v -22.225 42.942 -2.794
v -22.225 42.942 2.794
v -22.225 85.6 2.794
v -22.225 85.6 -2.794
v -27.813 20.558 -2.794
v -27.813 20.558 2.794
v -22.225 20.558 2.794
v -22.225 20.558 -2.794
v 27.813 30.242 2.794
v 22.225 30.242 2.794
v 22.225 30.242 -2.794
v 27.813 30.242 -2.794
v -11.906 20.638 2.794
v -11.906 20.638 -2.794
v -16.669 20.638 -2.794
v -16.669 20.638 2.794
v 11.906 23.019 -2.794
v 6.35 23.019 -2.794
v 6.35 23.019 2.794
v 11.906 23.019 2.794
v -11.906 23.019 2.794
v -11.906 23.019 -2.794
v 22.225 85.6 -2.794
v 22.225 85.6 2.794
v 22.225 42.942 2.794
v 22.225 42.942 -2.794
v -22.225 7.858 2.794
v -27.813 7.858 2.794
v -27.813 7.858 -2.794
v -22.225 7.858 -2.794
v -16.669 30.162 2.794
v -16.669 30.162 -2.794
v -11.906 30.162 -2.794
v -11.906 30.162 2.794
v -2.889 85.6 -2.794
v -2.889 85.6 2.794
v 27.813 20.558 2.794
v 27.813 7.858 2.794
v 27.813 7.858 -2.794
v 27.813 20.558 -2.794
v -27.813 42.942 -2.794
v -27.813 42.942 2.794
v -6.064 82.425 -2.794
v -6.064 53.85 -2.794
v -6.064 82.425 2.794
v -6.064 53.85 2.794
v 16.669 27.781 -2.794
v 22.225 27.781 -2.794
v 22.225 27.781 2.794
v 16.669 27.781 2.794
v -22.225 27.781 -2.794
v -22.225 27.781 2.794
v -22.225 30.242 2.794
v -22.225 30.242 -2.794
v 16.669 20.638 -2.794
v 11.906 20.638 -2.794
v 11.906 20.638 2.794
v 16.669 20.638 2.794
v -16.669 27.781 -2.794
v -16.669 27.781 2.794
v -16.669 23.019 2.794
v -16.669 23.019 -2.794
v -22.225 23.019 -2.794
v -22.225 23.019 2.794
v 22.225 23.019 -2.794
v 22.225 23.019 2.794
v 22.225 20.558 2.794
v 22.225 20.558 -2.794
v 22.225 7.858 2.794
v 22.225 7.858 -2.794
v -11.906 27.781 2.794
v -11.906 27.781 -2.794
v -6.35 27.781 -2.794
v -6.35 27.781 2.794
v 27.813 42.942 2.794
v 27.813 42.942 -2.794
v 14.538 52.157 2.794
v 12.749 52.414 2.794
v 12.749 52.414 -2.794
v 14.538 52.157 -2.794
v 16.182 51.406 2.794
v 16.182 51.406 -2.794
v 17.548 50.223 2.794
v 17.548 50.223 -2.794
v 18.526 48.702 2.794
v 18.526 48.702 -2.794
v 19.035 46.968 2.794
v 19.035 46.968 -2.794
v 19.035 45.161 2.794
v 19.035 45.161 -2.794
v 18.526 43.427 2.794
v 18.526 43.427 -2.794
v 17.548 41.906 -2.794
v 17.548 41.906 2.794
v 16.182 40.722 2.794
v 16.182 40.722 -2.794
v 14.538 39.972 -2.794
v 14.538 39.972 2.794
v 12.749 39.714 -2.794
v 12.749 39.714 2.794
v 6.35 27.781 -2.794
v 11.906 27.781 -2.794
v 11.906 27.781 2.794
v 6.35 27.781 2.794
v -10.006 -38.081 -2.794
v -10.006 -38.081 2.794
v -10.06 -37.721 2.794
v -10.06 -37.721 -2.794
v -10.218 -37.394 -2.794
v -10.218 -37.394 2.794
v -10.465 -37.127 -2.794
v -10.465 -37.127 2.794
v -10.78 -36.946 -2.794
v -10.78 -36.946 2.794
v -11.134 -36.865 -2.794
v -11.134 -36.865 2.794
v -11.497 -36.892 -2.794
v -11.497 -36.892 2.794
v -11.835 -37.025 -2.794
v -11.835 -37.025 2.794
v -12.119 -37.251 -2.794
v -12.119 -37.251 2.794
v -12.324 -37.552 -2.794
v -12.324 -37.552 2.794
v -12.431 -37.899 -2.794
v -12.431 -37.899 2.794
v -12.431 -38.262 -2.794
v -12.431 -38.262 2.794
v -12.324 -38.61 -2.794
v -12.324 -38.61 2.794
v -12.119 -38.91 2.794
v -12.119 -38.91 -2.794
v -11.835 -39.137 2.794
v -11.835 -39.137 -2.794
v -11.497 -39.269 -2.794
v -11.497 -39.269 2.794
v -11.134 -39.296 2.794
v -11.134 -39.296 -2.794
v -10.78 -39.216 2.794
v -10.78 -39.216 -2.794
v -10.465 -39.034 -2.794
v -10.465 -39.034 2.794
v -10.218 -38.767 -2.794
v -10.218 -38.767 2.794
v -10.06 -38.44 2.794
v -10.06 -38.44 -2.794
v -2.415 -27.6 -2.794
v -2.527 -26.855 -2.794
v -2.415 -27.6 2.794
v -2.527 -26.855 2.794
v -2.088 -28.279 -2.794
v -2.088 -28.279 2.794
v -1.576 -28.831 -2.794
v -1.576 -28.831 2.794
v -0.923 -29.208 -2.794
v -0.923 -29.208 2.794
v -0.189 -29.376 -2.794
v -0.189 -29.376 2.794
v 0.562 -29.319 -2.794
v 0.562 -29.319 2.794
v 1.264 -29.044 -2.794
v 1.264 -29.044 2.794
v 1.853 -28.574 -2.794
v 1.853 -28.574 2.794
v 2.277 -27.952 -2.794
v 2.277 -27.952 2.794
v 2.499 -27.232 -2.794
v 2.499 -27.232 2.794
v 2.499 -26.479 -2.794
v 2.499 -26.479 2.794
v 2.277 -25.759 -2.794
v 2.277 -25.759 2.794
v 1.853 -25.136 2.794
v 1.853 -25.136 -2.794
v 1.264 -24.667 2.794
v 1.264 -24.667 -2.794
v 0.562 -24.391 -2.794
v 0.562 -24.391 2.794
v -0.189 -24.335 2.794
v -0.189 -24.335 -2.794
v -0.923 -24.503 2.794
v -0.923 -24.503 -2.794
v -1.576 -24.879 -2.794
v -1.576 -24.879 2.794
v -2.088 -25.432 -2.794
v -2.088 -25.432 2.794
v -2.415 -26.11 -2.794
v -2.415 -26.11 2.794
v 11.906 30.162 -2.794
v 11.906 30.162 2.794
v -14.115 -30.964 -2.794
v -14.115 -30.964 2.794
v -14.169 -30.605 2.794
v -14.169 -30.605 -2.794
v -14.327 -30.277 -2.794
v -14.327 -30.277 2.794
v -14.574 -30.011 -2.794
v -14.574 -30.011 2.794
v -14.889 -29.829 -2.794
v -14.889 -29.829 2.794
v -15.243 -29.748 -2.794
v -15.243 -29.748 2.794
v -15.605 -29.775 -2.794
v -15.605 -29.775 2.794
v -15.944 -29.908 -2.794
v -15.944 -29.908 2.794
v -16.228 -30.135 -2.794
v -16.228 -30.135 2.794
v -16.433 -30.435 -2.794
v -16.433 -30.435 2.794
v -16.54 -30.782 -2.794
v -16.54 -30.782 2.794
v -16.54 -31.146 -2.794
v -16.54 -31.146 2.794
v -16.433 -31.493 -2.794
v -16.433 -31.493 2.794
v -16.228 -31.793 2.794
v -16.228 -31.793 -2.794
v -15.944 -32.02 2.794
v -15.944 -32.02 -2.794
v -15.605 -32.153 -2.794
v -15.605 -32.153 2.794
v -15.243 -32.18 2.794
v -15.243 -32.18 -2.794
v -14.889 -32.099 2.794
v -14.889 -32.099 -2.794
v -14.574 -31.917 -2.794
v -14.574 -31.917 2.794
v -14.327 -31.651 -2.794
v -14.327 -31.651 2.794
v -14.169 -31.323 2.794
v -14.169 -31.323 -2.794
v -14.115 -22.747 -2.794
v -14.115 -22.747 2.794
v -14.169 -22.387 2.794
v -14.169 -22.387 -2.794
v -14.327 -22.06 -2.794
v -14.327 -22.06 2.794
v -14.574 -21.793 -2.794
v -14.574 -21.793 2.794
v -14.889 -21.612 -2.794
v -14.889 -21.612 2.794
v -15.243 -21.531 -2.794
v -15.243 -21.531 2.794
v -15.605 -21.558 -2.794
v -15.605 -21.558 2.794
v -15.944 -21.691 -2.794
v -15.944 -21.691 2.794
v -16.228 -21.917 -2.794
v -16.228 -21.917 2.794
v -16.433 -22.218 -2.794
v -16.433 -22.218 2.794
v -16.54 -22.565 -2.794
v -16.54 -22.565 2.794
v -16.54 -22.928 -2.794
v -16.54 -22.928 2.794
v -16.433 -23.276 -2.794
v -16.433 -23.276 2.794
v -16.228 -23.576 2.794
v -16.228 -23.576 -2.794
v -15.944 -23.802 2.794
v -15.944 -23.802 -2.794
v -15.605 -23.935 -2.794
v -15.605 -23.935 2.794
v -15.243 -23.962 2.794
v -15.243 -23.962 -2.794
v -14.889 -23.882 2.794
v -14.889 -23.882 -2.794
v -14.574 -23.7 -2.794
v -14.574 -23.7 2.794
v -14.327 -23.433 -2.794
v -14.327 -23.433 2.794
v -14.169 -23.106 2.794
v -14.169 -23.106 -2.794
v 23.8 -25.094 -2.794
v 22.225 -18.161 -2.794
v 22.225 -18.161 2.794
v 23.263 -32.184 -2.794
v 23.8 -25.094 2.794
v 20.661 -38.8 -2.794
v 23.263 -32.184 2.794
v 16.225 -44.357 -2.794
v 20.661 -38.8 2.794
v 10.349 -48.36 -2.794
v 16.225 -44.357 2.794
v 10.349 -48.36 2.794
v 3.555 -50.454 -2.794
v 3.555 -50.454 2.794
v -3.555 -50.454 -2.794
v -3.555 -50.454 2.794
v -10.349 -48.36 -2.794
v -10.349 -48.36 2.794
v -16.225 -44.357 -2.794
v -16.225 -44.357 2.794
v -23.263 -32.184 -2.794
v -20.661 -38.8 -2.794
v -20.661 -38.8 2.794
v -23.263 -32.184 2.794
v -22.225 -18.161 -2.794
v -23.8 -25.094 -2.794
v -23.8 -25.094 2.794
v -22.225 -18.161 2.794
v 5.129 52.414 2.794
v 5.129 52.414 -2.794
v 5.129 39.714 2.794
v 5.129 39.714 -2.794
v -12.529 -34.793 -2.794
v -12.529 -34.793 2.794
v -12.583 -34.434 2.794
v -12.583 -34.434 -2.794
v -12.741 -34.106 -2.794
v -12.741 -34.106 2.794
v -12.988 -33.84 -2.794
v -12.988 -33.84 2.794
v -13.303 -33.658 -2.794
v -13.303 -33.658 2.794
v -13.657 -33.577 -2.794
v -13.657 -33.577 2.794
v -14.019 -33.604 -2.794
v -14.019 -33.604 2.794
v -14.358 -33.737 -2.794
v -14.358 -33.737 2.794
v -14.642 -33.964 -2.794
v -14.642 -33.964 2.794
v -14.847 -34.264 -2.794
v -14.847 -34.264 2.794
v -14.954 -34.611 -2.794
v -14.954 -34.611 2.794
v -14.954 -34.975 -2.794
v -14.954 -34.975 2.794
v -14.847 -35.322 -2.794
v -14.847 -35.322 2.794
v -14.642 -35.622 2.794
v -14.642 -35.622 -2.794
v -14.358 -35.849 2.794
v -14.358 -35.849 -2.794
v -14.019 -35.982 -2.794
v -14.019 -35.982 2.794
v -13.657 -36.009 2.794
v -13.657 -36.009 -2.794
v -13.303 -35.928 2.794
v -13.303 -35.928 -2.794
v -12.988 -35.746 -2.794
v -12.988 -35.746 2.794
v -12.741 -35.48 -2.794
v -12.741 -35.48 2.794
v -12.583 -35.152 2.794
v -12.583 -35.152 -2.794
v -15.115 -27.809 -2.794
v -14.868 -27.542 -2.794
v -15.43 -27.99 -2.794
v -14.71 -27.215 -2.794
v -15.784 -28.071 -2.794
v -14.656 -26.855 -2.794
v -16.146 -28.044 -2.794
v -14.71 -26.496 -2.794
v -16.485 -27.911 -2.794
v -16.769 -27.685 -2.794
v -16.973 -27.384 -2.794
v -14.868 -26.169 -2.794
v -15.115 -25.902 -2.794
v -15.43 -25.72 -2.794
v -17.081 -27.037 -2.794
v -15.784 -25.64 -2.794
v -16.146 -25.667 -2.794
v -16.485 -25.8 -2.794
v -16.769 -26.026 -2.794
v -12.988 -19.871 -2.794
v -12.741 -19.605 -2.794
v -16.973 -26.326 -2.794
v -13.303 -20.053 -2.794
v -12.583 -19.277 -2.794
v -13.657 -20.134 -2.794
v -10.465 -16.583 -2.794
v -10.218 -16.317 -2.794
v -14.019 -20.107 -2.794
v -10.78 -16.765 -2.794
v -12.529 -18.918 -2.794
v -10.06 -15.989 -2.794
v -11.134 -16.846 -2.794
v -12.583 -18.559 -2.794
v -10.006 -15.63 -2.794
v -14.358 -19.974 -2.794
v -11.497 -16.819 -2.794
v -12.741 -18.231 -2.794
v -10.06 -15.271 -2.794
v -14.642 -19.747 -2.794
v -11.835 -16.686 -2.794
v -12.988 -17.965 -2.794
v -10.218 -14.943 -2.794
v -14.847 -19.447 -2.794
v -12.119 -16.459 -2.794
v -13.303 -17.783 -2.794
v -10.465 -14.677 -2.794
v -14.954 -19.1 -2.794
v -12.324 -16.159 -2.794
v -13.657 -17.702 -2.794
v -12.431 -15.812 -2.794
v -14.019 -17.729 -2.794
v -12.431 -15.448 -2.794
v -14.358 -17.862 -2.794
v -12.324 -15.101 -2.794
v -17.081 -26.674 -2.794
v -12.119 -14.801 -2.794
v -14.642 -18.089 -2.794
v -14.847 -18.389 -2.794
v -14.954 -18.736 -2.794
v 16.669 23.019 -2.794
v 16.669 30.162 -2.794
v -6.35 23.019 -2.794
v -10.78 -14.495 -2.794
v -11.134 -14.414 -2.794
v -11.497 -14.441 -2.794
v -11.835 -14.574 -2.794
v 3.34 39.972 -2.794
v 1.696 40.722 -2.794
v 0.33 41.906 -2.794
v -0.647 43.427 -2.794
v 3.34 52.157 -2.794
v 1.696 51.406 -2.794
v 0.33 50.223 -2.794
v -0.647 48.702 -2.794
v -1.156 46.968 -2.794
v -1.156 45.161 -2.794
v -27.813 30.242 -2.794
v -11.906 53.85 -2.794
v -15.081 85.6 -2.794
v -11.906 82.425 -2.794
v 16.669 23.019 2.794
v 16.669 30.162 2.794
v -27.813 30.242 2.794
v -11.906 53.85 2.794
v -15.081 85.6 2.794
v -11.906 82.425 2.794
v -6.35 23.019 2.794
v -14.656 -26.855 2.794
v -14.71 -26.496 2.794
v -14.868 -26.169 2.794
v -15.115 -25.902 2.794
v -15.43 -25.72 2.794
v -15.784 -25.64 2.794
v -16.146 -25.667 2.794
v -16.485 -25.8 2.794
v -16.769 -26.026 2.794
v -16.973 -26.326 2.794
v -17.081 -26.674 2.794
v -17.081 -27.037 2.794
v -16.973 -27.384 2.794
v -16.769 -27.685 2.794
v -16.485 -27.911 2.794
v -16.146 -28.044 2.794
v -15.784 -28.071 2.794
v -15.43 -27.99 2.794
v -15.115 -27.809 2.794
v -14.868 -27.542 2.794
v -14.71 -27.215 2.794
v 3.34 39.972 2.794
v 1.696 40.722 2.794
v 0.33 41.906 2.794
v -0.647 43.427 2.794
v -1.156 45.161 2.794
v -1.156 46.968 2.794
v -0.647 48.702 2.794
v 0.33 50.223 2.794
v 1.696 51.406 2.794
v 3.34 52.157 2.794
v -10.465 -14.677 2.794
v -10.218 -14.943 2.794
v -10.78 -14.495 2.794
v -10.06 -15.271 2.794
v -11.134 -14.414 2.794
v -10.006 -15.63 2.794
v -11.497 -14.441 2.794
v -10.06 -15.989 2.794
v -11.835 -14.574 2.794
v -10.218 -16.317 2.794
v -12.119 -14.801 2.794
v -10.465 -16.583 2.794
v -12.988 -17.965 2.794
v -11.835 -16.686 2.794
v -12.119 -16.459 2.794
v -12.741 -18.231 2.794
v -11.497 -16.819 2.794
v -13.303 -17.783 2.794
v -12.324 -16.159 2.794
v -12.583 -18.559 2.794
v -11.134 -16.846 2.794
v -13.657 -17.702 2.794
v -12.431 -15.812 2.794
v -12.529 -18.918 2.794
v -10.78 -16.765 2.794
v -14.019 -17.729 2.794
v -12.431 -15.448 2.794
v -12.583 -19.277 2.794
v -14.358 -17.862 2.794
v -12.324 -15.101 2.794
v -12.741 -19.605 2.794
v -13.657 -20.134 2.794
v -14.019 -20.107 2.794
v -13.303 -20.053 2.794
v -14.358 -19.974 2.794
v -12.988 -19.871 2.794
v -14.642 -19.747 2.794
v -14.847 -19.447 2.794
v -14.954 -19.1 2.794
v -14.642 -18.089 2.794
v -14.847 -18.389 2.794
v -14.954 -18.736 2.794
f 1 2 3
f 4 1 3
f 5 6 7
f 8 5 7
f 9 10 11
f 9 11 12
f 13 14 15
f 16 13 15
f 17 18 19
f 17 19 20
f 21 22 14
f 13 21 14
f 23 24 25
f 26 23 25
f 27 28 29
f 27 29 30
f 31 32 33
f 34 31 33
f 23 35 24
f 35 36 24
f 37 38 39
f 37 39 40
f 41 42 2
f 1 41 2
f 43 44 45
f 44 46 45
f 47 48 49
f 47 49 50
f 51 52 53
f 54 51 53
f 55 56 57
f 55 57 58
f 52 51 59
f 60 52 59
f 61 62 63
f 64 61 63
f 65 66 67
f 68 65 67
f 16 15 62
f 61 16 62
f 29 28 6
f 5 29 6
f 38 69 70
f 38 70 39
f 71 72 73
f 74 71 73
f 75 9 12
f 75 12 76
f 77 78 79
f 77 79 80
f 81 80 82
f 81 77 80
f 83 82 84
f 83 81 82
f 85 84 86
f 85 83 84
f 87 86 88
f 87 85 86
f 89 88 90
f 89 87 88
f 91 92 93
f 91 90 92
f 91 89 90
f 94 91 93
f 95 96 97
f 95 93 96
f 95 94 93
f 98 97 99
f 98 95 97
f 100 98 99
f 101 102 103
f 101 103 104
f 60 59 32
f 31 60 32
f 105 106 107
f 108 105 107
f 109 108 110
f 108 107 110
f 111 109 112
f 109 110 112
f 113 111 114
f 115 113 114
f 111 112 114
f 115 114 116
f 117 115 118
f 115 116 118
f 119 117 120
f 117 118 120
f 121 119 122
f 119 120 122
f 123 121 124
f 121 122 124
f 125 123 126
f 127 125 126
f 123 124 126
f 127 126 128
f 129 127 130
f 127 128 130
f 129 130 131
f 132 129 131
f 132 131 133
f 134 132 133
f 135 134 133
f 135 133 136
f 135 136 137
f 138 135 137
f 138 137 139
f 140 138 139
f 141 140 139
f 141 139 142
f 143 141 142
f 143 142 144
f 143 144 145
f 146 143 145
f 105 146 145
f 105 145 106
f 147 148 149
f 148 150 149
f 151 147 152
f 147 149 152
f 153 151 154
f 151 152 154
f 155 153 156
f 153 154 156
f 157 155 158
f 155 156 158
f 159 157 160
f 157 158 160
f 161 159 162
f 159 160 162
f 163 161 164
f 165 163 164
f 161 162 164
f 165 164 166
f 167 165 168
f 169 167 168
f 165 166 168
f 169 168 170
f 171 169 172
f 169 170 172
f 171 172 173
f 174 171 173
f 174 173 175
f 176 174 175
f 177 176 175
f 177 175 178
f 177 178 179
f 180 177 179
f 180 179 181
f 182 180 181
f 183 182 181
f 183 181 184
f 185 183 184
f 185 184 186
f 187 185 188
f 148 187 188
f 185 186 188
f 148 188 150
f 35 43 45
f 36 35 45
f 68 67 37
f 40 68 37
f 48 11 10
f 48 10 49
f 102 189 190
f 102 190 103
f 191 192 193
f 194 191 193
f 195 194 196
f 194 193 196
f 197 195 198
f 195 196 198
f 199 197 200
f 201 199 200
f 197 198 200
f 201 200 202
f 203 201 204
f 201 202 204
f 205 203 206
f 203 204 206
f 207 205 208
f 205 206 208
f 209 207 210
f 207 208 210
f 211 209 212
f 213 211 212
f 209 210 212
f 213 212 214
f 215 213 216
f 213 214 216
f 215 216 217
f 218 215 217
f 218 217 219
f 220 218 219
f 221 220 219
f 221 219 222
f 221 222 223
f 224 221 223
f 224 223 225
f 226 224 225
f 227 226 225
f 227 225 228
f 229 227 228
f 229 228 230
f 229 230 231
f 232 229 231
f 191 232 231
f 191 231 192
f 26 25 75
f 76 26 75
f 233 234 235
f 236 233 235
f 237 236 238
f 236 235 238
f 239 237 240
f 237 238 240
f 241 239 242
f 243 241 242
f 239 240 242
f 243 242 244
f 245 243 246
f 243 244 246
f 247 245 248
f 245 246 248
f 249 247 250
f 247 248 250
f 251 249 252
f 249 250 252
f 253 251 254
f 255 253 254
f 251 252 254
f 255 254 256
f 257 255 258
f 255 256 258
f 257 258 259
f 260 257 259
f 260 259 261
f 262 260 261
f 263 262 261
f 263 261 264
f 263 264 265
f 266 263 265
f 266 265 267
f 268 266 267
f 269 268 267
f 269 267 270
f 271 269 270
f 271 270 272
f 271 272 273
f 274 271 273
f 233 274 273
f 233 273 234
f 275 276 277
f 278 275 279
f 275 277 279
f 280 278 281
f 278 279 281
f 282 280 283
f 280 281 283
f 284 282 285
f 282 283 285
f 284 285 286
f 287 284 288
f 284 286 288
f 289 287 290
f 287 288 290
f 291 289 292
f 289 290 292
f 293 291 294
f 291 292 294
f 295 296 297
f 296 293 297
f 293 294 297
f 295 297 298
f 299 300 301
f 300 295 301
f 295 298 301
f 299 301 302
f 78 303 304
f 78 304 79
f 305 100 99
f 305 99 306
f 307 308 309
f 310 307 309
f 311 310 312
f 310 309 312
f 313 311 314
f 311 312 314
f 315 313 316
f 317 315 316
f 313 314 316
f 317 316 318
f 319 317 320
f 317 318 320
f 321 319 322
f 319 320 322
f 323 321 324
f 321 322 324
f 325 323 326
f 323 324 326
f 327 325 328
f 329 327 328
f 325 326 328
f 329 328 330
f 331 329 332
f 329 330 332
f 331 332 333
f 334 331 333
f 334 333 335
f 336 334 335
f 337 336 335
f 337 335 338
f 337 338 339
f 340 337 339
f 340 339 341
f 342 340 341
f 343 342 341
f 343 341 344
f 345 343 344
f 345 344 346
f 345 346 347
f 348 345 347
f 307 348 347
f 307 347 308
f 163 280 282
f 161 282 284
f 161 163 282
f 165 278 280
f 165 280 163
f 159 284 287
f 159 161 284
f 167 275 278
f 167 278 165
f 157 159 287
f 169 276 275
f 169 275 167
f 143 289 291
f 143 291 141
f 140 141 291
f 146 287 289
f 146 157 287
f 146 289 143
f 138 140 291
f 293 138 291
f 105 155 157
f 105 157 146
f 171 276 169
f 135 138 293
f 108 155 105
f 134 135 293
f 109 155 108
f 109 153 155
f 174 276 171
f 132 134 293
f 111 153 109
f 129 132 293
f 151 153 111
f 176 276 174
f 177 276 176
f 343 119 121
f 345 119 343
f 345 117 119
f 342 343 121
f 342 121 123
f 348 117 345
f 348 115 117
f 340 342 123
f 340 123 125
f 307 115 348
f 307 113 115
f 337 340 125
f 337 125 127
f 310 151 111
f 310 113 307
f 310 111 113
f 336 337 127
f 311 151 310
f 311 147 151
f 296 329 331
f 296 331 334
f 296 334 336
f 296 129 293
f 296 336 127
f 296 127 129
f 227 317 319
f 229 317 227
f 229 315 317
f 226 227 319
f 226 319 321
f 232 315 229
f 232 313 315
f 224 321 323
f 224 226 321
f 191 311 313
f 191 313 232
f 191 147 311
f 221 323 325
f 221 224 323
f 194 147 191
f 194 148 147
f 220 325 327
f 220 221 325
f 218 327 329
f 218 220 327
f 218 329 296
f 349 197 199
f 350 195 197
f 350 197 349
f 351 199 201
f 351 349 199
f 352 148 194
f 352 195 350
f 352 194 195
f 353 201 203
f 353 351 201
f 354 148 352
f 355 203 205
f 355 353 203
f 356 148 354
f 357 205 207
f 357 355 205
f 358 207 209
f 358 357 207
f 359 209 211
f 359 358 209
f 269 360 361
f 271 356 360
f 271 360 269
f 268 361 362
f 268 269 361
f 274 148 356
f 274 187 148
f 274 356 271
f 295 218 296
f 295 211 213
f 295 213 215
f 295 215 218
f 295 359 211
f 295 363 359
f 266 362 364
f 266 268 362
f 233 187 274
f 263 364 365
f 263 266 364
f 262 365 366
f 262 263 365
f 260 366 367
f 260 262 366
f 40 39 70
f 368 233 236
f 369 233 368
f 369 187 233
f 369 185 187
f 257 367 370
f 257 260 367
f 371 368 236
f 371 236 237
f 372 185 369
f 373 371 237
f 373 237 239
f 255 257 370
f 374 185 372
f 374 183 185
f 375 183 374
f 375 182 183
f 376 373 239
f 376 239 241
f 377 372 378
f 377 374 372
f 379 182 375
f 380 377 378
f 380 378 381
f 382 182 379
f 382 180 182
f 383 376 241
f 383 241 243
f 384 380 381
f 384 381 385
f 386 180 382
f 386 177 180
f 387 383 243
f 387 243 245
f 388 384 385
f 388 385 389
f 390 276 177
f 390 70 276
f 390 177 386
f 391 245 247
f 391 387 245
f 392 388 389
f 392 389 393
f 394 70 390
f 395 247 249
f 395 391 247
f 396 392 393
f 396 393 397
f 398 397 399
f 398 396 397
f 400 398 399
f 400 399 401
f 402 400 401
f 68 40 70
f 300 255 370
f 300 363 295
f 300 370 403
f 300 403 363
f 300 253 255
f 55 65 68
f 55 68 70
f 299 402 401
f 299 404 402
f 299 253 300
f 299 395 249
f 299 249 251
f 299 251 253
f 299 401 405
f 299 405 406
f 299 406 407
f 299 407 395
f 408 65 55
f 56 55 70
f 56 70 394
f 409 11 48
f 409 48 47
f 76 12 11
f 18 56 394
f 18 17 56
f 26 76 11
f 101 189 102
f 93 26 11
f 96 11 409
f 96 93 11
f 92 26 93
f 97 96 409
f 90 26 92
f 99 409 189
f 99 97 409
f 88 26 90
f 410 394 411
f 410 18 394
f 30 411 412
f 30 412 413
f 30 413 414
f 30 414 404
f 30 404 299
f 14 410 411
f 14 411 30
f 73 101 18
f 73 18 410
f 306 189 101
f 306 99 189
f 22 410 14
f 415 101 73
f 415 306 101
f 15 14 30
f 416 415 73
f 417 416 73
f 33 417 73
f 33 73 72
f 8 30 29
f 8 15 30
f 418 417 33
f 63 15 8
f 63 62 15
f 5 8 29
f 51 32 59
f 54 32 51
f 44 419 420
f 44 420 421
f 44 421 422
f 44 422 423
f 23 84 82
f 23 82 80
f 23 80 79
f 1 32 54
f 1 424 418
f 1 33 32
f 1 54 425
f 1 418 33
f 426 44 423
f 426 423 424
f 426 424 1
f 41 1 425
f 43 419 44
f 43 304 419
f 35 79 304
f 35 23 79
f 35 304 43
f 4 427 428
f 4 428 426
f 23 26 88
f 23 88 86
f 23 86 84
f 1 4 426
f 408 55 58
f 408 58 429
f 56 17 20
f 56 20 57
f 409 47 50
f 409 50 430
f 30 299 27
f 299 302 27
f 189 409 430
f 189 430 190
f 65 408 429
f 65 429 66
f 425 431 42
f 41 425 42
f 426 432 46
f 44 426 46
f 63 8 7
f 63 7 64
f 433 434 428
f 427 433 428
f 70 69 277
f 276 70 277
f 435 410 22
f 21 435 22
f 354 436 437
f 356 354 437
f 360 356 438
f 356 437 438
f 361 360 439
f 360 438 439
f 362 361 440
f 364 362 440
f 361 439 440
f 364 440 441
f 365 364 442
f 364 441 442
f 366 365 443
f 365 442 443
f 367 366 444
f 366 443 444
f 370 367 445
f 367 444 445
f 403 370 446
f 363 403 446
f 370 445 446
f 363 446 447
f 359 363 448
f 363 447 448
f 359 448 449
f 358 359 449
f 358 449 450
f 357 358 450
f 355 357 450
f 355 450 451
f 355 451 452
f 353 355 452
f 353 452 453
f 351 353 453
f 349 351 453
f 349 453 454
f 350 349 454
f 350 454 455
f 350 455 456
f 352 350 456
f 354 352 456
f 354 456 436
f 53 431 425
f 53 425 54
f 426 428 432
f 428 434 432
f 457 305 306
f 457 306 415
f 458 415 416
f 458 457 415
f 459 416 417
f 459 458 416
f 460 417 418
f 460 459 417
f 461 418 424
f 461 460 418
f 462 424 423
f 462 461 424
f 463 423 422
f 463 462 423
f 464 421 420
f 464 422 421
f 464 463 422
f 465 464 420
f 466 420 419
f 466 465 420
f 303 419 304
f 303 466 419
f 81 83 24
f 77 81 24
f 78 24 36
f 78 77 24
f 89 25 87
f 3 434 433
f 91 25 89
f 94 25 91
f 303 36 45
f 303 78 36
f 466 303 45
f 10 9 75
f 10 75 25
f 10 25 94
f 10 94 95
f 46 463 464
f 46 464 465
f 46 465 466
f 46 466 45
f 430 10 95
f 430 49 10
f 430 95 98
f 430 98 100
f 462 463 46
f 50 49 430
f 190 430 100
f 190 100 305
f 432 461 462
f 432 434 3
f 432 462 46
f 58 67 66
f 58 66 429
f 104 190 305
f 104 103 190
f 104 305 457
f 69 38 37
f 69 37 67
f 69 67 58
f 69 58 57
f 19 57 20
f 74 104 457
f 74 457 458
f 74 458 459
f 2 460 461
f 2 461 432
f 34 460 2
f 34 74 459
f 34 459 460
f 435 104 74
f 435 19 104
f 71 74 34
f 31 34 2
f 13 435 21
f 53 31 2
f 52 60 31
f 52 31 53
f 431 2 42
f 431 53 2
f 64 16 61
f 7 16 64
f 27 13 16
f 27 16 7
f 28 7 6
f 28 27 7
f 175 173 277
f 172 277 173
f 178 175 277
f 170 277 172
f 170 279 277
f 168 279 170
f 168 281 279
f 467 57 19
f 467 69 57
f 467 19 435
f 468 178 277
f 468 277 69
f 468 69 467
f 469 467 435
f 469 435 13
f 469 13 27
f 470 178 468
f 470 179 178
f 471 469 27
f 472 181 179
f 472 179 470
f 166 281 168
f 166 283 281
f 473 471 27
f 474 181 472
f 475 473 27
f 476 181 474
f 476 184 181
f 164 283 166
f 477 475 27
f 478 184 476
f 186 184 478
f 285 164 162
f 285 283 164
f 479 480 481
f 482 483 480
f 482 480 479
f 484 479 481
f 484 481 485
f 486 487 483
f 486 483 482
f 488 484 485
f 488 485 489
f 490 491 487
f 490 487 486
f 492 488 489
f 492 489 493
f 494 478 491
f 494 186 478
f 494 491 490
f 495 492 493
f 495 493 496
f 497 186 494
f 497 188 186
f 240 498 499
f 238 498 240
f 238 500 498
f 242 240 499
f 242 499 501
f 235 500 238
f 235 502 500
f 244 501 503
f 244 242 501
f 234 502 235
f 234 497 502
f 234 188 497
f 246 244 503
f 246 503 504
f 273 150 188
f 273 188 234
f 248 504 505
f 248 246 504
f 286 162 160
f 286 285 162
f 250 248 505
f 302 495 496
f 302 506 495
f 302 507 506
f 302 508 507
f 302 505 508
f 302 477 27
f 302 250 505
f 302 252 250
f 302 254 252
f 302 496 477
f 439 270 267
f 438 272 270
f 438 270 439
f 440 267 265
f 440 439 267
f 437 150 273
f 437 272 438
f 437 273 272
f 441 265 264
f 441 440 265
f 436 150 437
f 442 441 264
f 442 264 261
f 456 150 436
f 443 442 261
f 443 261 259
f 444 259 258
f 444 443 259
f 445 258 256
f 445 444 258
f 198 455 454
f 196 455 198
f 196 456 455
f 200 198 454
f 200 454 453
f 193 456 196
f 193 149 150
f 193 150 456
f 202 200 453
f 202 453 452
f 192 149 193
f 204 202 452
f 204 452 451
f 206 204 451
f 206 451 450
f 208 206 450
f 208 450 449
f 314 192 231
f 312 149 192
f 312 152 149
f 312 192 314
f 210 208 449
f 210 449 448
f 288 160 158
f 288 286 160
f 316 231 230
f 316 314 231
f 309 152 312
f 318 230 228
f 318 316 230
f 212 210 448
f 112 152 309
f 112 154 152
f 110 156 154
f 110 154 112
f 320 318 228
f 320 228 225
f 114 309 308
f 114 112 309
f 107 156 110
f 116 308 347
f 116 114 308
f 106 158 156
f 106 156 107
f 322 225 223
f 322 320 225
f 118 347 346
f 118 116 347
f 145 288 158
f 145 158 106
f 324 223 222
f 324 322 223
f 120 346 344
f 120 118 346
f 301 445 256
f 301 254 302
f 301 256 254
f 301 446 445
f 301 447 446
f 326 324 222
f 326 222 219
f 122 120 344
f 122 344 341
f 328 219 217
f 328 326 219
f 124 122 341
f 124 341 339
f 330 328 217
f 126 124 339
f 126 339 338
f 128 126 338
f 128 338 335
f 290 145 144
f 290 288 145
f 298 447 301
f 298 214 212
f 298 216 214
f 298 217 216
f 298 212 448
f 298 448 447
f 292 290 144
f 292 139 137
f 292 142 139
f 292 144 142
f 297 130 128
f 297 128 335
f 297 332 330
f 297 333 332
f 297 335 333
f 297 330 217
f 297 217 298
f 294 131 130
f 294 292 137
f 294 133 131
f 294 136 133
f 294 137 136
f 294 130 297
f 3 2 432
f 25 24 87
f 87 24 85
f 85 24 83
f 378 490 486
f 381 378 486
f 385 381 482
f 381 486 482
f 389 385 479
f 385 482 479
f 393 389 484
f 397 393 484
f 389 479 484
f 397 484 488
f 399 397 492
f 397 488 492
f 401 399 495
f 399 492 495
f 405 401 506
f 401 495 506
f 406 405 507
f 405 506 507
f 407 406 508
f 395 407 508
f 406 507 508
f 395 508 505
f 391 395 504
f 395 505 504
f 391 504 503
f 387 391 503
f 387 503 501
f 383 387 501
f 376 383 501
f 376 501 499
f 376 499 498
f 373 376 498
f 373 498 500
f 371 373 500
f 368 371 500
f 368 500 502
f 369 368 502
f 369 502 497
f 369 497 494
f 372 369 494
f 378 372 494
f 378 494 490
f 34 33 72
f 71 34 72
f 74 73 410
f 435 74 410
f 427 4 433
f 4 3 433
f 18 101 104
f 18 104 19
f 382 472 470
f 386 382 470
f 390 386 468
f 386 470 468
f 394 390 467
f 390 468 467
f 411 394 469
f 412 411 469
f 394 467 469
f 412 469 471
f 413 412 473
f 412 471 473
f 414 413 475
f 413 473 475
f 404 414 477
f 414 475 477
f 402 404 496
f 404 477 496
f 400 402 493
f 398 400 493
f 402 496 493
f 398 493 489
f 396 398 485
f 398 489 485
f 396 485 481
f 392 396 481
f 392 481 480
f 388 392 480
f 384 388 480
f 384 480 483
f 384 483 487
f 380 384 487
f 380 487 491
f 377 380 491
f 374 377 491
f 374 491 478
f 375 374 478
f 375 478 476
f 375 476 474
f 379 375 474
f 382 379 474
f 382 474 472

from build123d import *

# Parameters (mm, degrees)
BOSS_EXTRUDE1_DEPTH             = 2.794
CUT_EXTRUDE1_DEPTH              = 89.482328967
CUT_EXTRUDE1_DEPTH_BACK         = 89.482328967
BOSS_EXTRUDE2_REACH             = 90.482
SKETCH3_W                       = 5.588
SKETCH3_H                       = 12.7
BOSS_EXTRUDE2_DIRECTION_2_REACH = 90.482
BOSS_EXTRUDE3_REACH             = 92.049
SKETCH4_R                       = 2.5273
BOSS_EXTRUDE3_DIRECTION_2_REACH = 92.049
SKETCH6_R                       = 1.2192
CUT_EXTRUDE8_DEPTH              = 91.178457469
CHAMFER1_SIZE                   = 3.175
CUT_EXTRUDE10_DEPTH             = 91.178457469


with BuildPart() as part:
    # Sketch1 → Boss-Extrude1 (new, symmetric)
    with BuildSketch(Plane.XY):
        Polygon((-6.06425, 85.600032), (22.225, 85.600032), (22.225, 0), (-22.225, 0), (-22.225, 85.600032), (-11.90625, 85.600032), (-11.90625, 53.850032), (-6.06425, 53.850032), align=None)
    extrude(amount=BOSS_EXTRUDE1_DEPTH, both=True)

    # Sketch2 → Cut-Extrude1 (cut, two sides: drawn at the far end of the back side and taken through both)
    with BuildSketch(Plane.XY.offset(-CUT_EXTRUDE1_DEPTH_BACK)):
        Polygon((-22.225, 27.78125), (-16.66875, 27.78125), (-16.66875, 30.1625), (-11.90625, 30.1625), (-11.90625, 27.78125), (-6.35, 27.78125), (-6.35, 23.01875), (-11.90625, 23.01875), (-11.90625, 20.6375), (-16.66875, 20.6375), (-16.66875, 23.01875), (-22.225, 23.01875), align=None)
        Polygon((22.225, 27.78125), (16.66875, 27.78125), (16.66875, 30.1625), (11.90625, 30.1625), (11.90625, 27.78125), (6.35, 27.78125), (6.35, 23.01875), (11.90625, 23.01875), (11.90625, 20.6375), (16.66875, 20.6375), (16.66875, 23.01875), (22.225, 23.01875), align=None)
    extrude(amount=CUT_EXTRUDE1_DEPTH + CUT_EXTRUDE1_DEPTH_BACK, mode=Mode.SUBTRACT)

    # Boss-Extrude2: up to this face of the body (flat: up to its plane)
    boss_extrude2_end = Plane(part.part.faces().sort_by_distance((0.486906513, 42.340229634, 2.794))[0])
    # Sketch3 → Boss-Extrude2 (add, up to the picked face)
    with BuildSketch(Plane.XY, mode=Mode.PRIVATE) as boss_extrude2_sk1:
        with Locations((-25.019, 14.208252)):
            Rectangle(SKETCH3_W, SKETCH3_H)
    boss_extrude2_tool1 = split(extrude(boss_extrude2_sk1.sketch, amount=BOSS_EXTRUDE2_REACH, mode=Mode.PRIVATE), bisect_by=boss_extrude2_end, keep=Keep.BOTH, mode=Mode.PRIVATE)
    # Sketch3 → Boss-Extrude2 (add, up to the picked face)
    with BuildSketch(Plane.XY, mode=Mode.PRIVATE) as boss_extrude2_sk2:
        with Locations((25.019, 14.208252)):
            Rectangle(SKETCH3_W, SKETCH3_H)
    boss_extrude2_tool2 = split(extrude(boss_extrude2_sk2.sketch, amount=BOSS_EXTRUDE2_REACH, mode=Mode.PRIVATE), bisect_by=boss_extrude2_end, keep=Keep.BOTH, mode=Mode.PRIVATE)
    # Sketch3 → Boss-Extrude2 (add, up to the picked face)
    with BuildSketch(Plane.XY, mode=Mode.PRIVATE) as boss_extrude2_sk3:
        with Locations((-25.019, 36.591748)):
            Rectangle(SKETCH3_W, SKETCH3_H)
    boss_extrude2_tool3 = split(extrude(boss_extrude2_sk3.sketch, amount=BOSS_EXTRUDE2_REACH, mode=Mode.PRIVATE), bisect_by=boss_extrude2_end, keep=Keep.BOTH, mode=Mode.PRIVATE)
    # Sketch3 → Boss-Extrude2 (add, up to the picked face)
    with BuildSketch(Plane.XY, mode=Mode.PRIVATE) as boss_extrude2_sk4:
        with Locations((25.019, 36.591748)):
            Rectangle(SKETCH3_W, SKETCH3_H)
    boss_extrude2_tool4 = split(extrude(boss_extrude2_sk4.sketch, amount=BOSS_EXTRUDE2_REACH, mode=Mode.PRIVATE), bisect_by=boss_extrude2_end, keep=Keep.BOTH, mode=Mode.PRIVATE)
    add(boss_extrude2_tool1.solids().sort_by(Axis((-25.019, 14.208252, 0), (0, 0, 1)))[0])
    add(boss_extrude2_tool2.solids().sort_by(Axis((25.019, 14.208252, 0), (0, 0, 1)))[0])
    add(boss_extrude2_tool3.solids().sort_by(Axis((-25.019, 36.591748, 0), (0, 0, 1)))[0])
    add(boss_extrude2_tool4.solids().sort_by(Axis((25.019, 36.591748, 0), (0, 0, 1)))[0])

    # Boss-Extrude2 direction 2: up to this face of the body (flat: up to its plane)
    boss_extrude2_direction_2_end = Plane(part.part.faces().sort_by_distance((0.486906513, 42.340229634, -2.794))[0])
    # Sketch3 → Boss-Extrude2 direction 2 (add, up to the picked face)
    with BuildSketch(Plane.XY, mode=Mode.PRIVATE) as boss_extrude2_direction_2_sk1:
        with Locations((-25.019, 14.208252)):
            Rectangle(SKETCH3_W, SKETCH3_H)
    boss_extrude2_direction_2_tool1 = split(extrude(boss_extrude2_direction_2_sk1.sketch, amount=-BOSS_EXTRUDE2_DIRECTION_2_REACH, mode=Mode.PRIVATE), bisect_by=boss_extrude2_direction_2_end, keep=Keep.BOTH, mode=Mode.PRIVATE)
    # Sketch3 → Boss-Extrude2 direction 2 (add, up to the picked face)
    with BuildSketch(Plane.XY, mode=Mode.PRIVATE) as boss_extrude2_direction_2_sk2:
        with Locations((25.019, 14.208252)):
            Rectangle(SKETCH3_W, SKETCH3_H)
    boss_extrude2_direction_2_tool2 = split(extrude(boss_extrude2_direction_2_sk2.sketch, amount=-BOSS_EXTRUDE2_DIRECTION_2_REACH, mode=Mode.PRIVATE), bisect_by=boss_extrude2_direction_2_end, keep=Keep.BOTH, mode=Mode.PRIVATE)
    # Sketch3 → Boss-Extrude2 direction 2 (add, up to the picked face)
    with BuildSketch(Plane.XY, mode=Mode.PRIVATE) as boss_extrude2_direction_2_sk3:
        with Locations((-25.019, 36.591748)):
            Rectangle(SKETCH3_W, SKETCH3_H)
    boss_extrude2_direction_2_tool3 = split(extrude(boss_extrude2_direction_2_sk3.sketch, amount=-BOSS_EXTRUDE2_DIRECTION_2_REACH, mode=Mode.PRIVATE), bisect_by=boss_extrude2_direction_2_end, keep=Keep.BOTH, mode=Mode.PRIVATE)
    # Sketch3 → Boss-Extrude2 direction 2 (add, up to the picked face)
    with BuildSketch(Plane.XY, mode=Mode.PRIVATE) as boss_extrude2_direction_2_sk4:
        with Locations((25.019, 36.591748)):
            Rectangle(SKETCH3_W, SKETCH3_H)
    boss_extrude2_direction_2_tool4 = split(extrude(boss_extrude2_direction_2_sk4.sketch, amount=-BOSS_EXTRUDE2_DIRECTION_2_REACH, mode=Mode.PRIVATE), bisect_by=boss_extrude2_direction_2_end, keep=Keep.BOTH, mode=Mode.PRIVATE)
    add(boss_extrude2_direction_2_tool1.solids().sort_by(Axis((-25.019, 14.208252, 0), (0, 0, -1)))[0])
    add(boss_extrude2_direction_2_tool2.solids().sort_by(Axis((25.019, 14.208252, 0), (0, 0, -1)))[0])
    add(boss_extrude2_direction_2_tool3.solids().sort_by(Axis((-25.019, 36.591748, 0), (0, 0, -1)))[0])
    add(boss_extrude2_direction_2_tool4.solids().sort_by(Axis((25.019, 36.591748, 0), (0, 0, -1)))[0])

    # Boss-Extrude3: up to this face of the body (flat: up to its plane)
    boss_extrude3_end = Plane(part.part.faces().sort_by_distance((0.449618089, 41.042907789, 2.794))[0])
    # Sketch4 → Boss-Extrude3 (add, up to the picked face)
    with BuildSketch(Plane.XY, mode=Mode.PRIVATE) as boss_extrude3_sk1:
        with BuildLine():
            Line((-22.225, 0), (22.225, 0))
            Line((22.225, 0), (22.225, -18.161))
            ThreePointArc((22.225, -18.161), (0, -50.720463079), (-22.225, -18.161))
            Line((-22.225, -18.161), (-22.225, 0))
        make_face()
        with Locations(Location((0, -26.855369585, 0), (0, 0, 180))):
            Circle(SKETCH4_R, mode=Mode.SUBTRACT)
    boss_extrude3_tool1 = split(extrude(boss_extrude3_sk1.sketch, amount=BOSS_EXTRUDE3_REACH, mode=Mode.PRIVATE), bisect_by=boss_extrude3_end, keep=Keep.BOTH, mode=Mode.PRIVATE)
    add(boss_extrude3_tool1.solids().sort_by(Axis((0, -23.48752, 0), (0, 0, 1)))[0])

    # Boss-Extrude3 direction 2: up to this face of the body (flat: up to its plane)
    boss_extrude3_direction_2_end = Plane(part.part.faces().sort_by_distance((0.449618089, 41.042907789, -2.794))[0])
    # Sketch4 → Boss-Extrude3 direction 2 (add, up to the picked face)
    with BuildSketch(Plane.XY, mode=Mode.PRIVATE) as boss_extrude3_direction_2_sk1:
        with BuildLine():
            Line((-22.225, 0), (22.225, 0))
            Line((22.225, 0), (22.225, -18.161))
            ThreePointArc((22.225, -18.161), (0, -50.720463079), (-22.225, -18.161))
            Line((-22.225, -18.161), (-22.225, 0))
        make_face()
        with Locations(Location((0, -26.855369585, 0), (0, 0, 180))):
            Circle(SKETCH4_R, mode=Mode.SUBTRACT)
    boss_extrude3_direction_2_tool1 = split(extrude(boss_extrude3_direction_2_sk1.sketch, amount=-BOSS_EXTRUDE3_DIRECTION_2_REACH, mode=Mode.PRIVATE), bisect_by=boss_extrude3_direction_2_end, keep=Keep.BOTH, mode=Mode.PRIVATE)
    add(boss_extrude3_direction_2_tool1.solids().sort_by(Axis((0, -23.48752, 0), (0, 0, -1)))[0])

    # Sketch6 → Cut-Extrude8 (cut, through all)
    with BuildSketch(Plane.XY.offset(2.794)):
        with Locations((-15.875, -26.855369585)):
            Circle(SKETCH6_R)
        with Locations((-15.334072492, -22.746617244)):
            Circle(SKETCH6_R)
        with Locations((-13.748153285, -18.917869585)):
            Circle(SKETCH6_R)
        with Locations((-11.225320151, -15.630049433)):
            Circle(SKETCH6_R)
        with Locations((-11.225320151, -38.080689736)):
            Circle(SKETCH6_R)
        with Locations((-13.748153285, -34.792869585)):
            Circle(SKETCH6_R)
        with Locations((-15.334072492, -30.964121926)):
            Circle(SKETCH6_R)
    extrude(amount=-CUT_EXTRUDE8_DEPTH, mode=Mode.SUBTRACT)

    # Chamfer1
    chamfer1_edges = [part.edges().sort_by_distance(p)[0] for p in [
        (-11.90625, 85.600032, 0),
        (-6.06425, 85.600032, 0),
    ]]
    chamfer(chamfer1_edges, length=CHAMFER1_SIZE)

    # Sketch8 → Cut-Extrude10 (cut, through all)
    with BuildSketch(Plane.XY.offset(2.794)):
        with BuildLine():
            Line((5.129422909, 52.414421713), (12.749422909, 52.414421713))
            ThreePointArc((12.749422909, 52.414421713), (19.099422909, 46.064421713), (12.749422909, 39.714421713))
            Line((12.749422909, 39.714421713), (5.129422909, 39.714421713))
            ThreePointArc((5.129422909, 39.714421713), (-1.220577091, 46.064421713), (5.129422909, 52.414421713))
        make_face()
    extrude(amount=-CUT_EXTRUDE10_DEPTH, mode=Mode.SUBTRACT)


solid = part.part
